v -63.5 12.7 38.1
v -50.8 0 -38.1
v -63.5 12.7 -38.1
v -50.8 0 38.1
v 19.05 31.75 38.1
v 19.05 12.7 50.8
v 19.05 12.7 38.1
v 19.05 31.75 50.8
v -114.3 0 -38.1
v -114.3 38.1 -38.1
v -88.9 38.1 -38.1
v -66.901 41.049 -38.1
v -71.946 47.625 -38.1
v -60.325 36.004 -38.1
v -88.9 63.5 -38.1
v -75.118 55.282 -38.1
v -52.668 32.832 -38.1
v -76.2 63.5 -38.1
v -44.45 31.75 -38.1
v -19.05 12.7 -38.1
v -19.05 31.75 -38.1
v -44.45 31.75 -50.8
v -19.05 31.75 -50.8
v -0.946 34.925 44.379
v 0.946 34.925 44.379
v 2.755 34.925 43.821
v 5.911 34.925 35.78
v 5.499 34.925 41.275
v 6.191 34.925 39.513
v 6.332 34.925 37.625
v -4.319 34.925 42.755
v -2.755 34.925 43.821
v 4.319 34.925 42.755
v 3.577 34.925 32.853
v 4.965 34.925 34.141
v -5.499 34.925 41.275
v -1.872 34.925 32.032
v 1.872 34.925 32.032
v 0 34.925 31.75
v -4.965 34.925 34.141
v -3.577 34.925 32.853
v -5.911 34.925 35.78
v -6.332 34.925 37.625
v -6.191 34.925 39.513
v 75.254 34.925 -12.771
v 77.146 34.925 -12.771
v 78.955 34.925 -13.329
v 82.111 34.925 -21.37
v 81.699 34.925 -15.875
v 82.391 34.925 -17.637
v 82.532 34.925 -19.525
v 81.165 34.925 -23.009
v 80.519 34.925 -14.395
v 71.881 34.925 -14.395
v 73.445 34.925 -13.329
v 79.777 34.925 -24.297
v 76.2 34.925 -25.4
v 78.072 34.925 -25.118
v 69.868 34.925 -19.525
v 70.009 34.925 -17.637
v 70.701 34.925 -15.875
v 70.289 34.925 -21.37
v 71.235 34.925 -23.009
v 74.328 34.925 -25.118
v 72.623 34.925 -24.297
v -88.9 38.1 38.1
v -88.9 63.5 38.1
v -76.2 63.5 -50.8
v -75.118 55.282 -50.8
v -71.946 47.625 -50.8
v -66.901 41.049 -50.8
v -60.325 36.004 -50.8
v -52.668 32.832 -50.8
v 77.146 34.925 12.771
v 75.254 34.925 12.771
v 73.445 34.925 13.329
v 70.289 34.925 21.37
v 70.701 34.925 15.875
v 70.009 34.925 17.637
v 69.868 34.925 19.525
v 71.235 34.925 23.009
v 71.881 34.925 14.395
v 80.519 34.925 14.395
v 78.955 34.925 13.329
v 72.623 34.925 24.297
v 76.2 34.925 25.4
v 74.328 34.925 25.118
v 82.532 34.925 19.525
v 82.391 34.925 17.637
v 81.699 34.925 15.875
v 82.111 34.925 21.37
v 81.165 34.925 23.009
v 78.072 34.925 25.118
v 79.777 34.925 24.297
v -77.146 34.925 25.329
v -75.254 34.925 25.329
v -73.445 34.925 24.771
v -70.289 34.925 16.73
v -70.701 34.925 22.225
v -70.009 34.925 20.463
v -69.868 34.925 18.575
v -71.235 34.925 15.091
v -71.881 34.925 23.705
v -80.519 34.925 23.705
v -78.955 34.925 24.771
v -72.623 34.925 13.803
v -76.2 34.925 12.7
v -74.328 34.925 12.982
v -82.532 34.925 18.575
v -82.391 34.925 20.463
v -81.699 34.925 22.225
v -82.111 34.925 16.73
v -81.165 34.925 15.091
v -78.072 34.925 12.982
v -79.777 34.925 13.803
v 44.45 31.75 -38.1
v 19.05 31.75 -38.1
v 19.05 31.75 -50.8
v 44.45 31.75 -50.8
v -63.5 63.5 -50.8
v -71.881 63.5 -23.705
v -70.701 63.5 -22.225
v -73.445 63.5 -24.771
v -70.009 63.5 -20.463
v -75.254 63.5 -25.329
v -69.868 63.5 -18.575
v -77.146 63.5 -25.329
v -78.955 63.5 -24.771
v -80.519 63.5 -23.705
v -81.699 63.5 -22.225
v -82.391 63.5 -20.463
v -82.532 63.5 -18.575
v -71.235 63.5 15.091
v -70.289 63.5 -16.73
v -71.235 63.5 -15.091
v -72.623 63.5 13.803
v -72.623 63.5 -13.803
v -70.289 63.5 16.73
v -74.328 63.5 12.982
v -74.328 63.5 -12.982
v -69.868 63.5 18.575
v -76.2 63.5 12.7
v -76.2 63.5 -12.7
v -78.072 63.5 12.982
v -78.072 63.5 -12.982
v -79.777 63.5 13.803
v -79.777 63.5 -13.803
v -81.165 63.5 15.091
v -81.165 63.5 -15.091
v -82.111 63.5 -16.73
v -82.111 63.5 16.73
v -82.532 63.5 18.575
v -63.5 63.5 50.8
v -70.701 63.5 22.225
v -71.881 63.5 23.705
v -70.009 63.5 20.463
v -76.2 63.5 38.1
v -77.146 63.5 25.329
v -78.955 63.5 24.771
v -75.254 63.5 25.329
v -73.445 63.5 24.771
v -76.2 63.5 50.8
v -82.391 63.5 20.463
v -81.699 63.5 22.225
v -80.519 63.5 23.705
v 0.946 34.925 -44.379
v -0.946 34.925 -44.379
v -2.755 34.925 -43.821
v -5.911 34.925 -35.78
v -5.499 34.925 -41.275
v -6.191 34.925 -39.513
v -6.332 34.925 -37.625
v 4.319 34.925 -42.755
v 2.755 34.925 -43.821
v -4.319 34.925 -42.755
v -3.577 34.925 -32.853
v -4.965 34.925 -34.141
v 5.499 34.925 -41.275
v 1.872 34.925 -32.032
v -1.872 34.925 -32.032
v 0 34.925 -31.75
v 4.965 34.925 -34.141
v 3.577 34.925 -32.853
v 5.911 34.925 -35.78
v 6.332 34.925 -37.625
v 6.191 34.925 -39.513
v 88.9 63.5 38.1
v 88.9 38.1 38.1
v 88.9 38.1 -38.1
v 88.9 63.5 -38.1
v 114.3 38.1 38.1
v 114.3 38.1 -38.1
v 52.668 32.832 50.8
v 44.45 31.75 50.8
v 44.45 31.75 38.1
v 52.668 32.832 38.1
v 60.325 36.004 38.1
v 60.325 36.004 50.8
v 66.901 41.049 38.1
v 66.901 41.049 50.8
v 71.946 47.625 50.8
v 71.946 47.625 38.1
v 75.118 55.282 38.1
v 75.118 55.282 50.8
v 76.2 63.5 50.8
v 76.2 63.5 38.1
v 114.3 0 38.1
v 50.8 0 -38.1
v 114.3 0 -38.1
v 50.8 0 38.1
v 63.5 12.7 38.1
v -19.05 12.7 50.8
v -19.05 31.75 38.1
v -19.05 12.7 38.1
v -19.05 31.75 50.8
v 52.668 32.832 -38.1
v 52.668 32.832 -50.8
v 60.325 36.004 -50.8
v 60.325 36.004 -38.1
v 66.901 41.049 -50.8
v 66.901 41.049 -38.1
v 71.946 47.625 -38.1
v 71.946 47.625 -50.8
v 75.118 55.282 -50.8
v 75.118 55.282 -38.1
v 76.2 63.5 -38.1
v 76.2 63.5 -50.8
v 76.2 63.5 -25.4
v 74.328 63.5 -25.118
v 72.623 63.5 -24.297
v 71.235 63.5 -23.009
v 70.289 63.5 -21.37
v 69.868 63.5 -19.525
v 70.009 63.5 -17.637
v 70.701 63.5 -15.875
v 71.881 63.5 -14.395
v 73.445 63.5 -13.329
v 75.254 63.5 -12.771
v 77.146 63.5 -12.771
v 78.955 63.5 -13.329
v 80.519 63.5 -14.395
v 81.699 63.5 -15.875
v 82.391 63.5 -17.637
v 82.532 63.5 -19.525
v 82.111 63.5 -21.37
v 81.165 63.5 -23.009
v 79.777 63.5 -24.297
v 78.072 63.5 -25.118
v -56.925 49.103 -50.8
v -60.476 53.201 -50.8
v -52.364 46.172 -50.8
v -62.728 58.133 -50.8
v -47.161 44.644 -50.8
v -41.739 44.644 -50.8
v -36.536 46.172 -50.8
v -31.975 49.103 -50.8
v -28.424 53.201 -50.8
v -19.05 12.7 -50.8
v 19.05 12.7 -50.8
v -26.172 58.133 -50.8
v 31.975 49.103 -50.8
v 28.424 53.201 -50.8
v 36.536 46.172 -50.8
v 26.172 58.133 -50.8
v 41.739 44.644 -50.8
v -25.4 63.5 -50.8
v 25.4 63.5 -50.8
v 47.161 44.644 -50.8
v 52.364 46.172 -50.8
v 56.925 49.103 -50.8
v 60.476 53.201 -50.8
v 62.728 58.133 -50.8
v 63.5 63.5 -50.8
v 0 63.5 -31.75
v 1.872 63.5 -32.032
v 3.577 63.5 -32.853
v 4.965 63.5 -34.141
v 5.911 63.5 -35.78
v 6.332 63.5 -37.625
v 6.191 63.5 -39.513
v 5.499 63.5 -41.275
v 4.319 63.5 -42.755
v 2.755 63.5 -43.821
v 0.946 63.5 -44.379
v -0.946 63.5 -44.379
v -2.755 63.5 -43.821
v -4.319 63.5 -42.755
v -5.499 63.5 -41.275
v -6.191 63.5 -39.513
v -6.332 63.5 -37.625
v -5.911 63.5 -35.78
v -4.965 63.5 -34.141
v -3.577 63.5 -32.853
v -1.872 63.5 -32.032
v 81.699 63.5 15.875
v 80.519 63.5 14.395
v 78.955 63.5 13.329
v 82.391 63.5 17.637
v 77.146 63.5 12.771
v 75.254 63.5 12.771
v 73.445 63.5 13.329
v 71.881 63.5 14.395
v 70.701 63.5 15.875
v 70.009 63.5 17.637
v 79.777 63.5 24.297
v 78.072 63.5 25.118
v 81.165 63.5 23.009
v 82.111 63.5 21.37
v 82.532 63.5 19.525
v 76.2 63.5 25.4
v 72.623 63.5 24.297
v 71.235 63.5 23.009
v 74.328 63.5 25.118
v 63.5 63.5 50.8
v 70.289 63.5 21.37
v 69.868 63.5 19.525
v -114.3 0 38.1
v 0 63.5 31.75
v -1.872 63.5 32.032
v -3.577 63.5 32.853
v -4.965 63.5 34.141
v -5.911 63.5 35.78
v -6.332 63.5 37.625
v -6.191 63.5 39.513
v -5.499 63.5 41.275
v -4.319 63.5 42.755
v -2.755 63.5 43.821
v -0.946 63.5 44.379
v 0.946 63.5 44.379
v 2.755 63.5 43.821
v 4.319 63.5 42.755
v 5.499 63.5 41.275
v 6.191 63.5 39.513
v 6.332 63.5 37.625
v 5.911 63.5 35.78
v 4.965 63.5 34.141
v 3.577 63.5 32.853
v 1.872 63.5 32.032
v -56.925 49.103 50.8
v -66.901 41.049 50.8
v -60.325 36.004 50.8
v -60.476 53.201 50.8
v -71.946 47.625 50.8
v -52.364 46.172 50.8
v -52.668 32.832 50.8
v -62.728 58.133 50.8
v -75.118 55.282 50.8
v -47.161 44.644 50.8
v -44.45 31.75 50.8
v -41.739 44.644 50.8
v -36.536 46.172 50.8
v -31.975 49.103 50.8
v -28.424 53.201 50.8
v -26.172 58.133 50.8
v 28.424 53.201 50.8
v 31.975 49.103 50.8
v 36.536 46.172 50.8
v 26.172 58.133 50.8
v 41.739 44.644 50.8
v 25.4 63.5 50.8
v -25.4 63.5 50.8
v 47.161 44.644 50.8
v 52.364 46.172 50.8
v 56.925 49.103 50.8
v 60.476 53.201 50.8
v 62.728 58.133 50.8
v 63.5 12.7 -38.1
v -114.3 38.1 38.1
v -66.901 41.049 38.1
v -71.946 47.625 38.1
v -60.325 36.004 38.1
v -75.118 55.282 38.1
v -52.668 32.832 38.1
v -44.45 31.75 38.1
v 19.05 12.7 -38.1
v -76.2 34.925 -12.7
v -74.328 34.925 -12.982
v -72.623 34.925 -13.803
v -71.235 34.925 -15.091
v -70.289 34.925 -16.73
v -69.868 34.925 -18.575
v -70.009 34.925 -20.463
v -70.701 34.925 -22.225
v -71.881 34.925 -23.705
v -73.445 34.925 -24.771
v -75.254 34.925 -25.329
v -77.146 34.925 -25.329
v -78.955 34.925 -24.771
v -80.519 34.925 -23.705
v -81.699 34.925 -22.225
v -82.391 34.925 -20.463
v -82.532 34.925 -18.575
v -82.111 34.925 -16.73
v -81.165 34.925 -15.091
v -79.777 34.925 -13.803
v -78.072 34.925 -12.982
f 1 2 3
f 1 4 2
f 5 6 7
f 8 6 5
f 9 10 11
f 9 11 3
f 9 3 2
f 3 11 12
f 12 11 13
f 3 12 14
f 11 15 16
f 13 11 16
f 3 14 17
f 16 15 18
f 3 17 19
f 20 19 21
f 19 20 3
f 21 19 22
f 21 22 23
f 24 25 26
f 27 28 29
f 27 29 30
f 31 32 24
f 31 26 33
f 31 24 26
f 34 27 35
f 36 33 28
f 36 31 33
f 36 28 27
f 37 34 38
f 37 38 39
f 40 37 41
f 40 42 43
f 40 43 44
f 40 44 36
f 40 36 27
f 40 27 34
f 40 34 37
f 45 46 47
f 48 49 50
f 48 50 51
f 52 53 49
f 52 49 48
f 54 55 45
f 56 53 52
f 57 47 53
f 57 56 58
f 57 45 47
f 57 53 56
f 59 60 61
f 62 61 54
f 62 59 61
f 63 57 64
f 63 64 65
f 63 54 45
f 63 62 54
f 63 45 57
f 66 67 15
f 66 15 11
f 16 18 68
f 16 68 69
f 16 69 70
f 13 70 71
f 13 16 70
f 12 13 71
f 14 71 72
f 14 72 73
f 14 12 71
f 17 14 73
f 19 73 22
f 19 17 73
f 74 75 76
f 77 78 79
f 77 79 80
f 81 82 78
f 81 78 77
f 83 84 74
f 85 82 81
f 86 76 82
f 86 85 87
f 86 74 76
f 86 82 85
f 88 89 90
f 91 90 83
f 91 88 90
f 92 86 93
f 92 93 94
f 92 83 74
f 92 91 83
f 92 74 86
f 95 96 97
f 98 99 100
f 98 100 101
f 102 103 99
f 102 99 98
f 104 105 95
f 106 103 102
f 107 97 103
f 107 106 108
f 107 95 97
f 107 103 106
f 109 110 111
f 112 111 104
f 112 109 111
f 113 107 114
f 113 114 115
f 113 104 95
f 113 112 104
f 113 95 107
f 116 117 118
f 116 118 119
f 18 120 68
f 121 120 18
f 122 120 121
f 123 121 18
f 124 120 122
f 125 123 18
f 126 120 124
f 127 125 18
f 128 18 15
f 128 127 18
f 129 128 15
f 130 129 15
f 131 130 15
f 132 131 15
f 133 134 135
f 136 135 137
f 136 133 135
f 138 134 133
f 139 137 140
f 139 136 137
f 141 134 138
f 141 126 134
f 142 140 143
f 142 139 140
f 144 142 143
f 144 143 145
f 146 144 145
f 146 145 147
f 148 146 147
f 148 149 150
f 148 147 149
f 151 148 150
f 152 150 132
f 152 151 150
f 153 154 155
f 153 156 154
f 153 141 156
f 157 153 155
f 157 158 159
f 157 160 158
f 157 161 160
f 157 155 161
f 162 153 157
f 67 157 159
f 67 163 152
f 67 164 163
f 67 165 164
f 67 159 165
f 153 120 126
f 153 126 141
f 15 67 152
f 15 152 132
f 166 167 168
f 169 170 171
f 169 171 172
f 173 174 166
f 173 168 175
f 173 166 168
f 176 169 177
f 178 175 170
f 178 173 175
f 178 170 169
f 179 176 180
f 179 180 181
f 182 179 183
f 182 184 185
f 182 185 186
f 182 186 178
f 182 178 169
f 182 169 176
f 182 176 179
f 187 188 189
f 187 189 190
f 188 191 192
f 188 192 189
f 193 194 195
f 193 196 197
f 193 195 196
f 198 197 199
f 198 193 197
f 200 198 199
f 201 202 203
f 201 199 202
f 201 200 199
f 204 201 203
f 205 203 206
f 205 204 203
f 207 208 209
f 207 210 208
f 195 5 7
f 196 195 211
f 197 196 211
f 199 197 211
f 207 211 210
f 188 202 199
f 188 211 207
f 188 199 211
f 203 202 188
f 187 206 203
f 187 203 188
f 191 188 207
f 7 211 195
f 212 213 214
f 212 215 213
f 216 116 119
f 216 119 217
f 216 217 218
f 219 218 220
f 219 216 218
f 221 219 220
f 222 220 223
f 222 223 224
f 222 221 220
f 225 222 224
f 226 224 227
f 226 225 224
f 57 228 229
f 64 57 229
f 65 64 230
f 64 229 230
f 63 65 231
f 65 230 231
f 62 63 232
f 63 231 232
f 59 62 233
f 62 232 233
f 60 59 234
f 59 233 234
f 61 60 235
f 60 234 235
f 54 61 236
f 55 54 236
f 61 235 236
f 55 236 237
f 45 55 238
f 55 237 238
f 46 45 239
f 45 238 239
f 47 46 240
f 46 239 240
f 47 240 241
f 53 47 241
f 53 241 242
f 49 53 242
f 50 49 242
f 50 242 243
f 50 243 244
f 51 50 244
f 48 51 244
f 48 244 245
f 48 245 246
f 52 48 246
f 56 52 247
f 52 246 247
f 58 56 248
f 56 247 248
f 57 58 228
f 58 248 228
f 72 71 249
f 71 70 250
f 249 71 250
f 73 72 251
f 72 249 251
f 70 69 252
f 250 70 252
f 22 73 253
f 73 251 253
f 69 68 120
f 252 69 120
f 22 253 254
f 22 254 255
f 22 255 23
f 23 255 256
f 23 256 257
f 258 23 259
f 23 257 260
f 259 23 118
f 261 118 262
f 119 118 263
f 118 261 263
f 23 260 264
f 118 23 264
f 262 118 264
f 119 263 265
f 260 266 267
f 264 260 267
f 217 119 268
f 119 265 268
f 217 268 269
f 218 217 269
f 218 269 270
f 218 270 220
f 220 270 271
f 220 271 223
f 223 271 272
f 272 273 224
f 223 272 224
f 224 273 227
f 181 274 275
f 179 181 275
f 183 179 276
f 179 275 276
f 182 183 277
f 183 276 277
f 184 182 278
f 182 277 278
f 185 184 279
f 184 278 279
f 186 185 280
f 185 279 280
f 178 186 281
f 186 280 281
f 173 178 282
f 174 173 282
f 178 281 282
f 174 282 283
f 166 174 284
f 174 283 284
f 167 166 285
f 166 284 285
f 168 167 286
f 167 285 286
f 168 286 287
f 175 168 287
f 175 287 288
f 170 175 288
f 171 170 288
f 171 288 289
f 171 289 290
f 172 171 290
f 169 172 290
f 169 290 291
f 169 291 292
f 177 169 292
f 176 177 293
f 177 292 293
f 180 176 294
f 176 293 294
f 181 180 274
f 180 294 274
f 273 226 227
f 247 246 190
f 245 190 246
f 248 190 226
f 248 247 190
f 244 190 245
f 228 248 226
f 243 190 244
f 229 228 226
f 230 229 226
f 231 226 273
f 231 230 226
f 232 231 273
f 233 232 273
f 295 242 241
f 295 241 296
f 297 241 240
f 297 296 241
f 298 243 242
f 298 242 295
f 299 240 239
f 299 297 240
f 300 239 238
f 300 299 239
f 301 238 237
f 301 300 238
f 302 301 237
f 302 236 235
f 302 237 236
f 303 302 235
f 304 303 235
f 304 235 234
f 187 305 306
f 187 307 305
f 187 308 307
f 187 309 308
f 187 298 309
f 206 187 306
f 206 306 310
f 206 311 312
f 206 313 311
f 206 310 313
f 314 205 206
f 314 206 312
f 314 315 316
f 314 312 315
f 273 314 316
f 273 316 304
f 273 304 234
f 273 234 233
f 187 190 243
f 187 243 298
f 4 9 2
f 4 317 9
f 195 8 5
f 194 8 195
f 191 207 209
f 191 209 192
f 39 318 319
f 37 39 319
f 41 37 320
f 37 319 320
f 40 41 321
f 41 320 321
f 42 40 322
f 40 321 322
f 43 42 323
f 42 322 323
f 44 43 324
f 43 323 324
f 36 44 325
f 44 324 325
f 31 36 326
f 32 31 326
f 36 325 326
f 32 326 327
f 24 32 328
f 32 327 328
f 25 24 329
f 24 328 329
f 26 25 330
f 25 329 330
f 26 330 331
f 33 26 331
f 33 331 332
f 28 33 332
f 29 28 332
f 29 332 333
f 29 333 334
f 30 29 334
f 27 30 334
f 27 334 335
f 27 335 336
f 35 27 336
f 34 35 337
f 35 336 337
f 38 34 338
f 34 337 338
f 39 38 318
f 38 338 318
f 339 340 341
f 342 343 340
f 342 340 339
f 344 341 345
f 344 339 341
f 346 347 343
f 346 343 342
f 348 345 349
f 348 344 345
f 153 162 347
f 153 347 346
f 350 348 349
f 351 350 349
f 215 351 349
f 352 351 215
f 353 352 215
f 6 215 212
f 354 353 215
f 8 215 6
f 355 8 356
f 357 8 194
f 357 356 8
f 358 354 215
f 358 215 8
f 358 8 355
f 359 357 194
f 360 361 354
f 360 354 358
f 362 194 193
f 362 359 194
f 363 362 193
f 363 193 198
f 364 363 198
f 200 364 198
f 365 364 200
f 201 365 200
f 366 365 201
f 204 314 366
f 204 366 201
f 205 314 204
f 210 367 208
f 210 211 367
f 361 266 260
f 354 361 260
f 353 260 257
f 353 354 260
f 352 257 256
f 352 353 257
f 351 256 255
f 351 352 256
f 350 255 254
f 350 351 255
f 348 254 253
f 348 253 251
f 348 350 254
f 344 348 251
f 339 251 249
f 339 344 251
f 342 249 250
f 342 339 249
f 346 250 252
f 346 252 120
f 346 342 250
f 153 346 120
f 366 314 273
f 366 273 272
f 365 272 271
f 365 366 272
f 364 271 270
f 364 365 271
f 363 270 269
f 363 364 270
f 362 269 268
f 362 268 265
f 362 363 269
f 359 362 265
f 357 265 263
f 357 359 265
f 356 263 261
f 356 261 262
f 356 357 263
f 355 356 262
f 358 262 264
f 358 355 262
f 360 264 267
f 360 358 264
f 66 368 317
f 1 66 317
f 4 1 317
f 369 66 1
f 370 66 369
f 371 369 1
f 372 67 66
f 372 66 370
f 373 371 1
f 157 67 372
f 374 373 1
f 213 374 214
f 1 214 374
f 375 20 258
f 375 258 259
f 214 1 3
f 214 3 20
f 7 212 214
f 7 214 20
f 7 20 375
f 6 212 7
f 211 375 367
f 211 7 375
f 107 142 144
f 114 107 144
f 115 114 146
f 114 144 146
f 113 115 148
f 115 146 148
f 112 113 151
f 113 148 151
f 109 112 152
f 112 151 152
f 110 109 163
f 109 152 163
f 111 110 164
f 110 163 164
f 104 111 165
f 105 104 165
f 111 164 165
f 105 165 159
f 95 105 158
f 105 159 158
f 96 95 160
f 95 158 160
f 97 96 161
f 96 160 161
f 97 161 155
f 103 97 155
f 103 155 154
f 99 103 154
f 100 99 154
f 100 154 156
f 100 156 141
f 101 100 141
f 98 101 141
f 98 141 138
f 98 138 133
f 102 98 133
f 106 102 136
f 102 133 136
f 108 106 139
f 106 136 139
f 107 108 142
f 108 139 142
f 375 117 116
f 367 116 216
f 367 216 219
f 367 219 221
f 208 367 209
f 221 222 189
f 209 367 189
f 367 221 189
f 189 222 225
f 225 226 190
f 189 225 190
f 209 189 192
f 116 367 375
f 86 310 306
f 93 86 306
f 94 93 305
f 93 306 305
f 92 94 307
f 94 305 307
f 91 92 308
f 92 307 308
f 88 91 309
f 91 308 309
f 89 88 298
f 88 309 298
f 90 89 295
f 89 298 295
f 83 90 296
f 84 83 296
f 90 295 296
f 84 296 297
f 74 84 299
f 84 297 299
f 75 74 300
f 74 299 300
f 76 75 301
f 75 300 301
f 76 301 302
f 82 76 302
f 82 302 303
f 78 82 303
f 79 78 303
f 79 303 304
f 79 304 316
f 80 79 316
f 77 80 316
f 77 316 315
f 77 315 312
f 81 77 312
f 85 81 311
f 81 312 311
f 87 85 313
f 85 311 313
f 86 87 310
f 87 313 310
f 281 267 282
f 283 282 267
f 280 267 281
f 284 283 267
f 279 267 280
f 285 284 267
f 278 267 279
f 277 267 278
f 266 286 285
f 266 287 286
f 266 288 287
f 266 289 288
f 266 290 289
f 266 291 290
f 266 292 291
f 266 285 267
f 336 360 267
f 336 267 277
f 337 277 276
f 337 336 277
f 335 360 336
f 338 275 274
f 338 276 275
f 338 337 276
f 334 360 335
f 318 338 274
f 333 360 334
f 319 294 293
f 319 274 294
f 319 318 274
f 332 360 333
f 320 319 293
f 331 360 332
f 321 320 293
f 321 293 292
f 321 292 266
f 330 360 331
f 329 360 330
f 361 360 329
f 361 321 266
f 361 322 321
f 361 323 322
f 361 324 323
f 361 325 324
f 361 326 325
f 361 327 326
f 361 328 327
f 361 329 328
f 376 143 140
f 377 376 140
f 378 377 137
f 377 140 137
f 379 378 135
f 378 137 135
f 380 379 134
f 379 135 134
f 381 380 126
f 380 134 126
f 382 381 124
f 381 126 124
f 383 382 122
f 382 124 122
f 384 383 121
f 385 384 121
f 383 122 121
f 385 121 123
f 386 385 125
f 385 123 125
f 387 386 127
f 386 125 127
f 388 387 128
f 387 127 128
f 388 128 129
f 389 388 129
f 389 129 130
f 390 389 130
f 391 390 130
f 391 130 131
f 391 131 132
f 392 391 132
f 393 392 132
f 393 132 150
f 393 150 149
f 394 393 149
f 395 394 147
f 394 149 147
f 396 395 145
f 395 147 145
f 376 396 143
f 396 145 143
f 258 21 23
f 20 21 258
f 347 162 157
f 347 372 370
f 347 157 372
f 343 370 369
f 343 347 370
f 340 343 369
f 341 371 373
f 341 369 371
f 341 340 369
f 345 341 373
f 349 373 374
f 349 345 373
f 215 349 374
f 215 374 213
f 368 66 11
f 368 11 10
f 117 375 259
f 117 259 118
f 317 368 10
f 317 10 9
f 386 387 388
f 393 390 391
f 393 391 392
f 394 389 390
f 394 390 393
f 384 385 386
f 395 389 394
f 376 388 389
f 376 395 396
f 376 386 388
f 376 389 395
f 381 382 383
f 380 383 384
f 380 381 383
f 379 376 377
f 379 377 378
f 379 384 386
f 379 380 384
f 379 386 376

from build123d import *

# Parameters (mm, degrees)
BOSS_EXTRUDE1_DEPTH   = 38.1
BOSS_EXTRUDE1_2_DEPTH = 38.1
BOSS_EXTRUDE2_DEPTH   = 50.8
SKETCH2_R             = 6.35
CUT_EXTRUDE2_DEPTH    = 28.575
SKETCH3_W             = 38.1
SKETCH3_H             = 101.6
CUT_EXTRUDE3_DEPTH    = 12.7


with BuildPart() as part:
    # Sketch1 → Boss-Extrude1 (new, symmetric)
    with BuildSketch(Plane.XY):
        with BuildLine():
            Line((50.8, 0), (114.3, 0))
            Line((114.3, 0), (114.3, 38.1))
            Line((114.3, 38.1), (88.9, 38.1))
            Line((88.9, 38.1), (88.9, 63.5))
            Line((88.9, 63.5), (76.2, 63.5))
            ThreePointArc((76.2, 63.5), (66.900640303, 41.049359697), (44.45, 31.75))
            Line((44.45, 31.75), (19.05, 31.75))
            Line((19.05, 31.75), (19.05, 12.7))
            Line((19.05, 12.7), (63.5, 12.7))
            Line((63.5, 12.7), (50.8, 0))
        make_face()
    extrude(amount=BOSS_EXTRUDE1_DEPTH, both=True)



with BuildPart() as body_2:
    # Sketch1 → Boss-Extrude1 2 (new, symmetric)
    with BuildSketch(Plane.XY):
        with BuildLine():
            Line((-63.5, 12.7), (-19.05, 12.7))
            Line((-19.05, 12.7), (-19.05, 31.75))
            Line((-19.05, 31.75), (-44.45, 31.75))
            ThreePointArc((-44.45, 31.75), (-66.900640303, 41.049359697), (-76.2, 63.5))
            Line((-76.2, 63.5), (-88.9, 63.5))
            Line((-88.9, 63.5), (-88.9, 38.1))
            Line((-88.9, 38.1), (-114.3, 38.1))
            Line((-114.3, 38.1), (-114.3, 0))
            Line((-114.3, 0), (-50.8, 0))
            Line((-50.8, 0), (-63.5, 12.7))
        make_face()
    extrude(amount=BOSS_EXTRUDE1_2_DEPTH, both=True)


with BuildPart() as part_1:
    add(part.part)

    add(body_2.part)  # Boss-Extrude2 merges body 2
    # Sketch1<3> → Boss-Extrude2 (add, symmetric)
    with BuildSketch(Plane.XY):
        with BuildLine():
            Line((19.05, 0), (19.05, 12.7))
            Line((19.05, 12.7), (19.05, 31.75))
            Line((19.05, 31.75), (44.45, 31.75))
            ThreePointArc((44.45, 31.75), (66.900640303, 41.049359697), (76.2, 63.5))
            Line((76.2, 63.5), (63.5, 63.5))
            ThreePointArc((63.5, 63.5), (44.45, 44.45), (25.4, 63.5))
            Line((25.4, 63.5), (0, 63.5))
            Line((0, 63.5), (0, 0))
            Line((0, 0), (19.05, 0))
        make_face()
        with BuildLine():
            Line((-19.05, 0), (0, 0))
            Line((0, 0), (0, 63.5))
            Line((0, 63.5), (-25.4, 63.5))
            ThreePointArc((-25.4, 63.5), (-44.45, 44.45), (-63.5, 63.5))
            Line((-63.5, 63.5), (-76.2, 63.5))
            ThreePointArc((-76.2, 63.5), (-66.900640303, 41.049359697), (-44.45, 31.75))
            Line((-44.45, 31.75), (-19.05, 31.75))
            Line((-19.05, 31.75), (-19.05, 12.7))
            Line((-19.05, 12.7), (-19.05, 0))
        make_face()
    extrude(amount=BOSS_EXTRUDE2_DEPTH, both=True)

    # Sketch2 → Cut-Extrude2 (cut)
    with BuildSketch(Plane(origin=(0, 63.5, 0), x_dir=(1, 0, 0), z_dir=(0, 1, 0))):
        with Locations(Location((-76.2, 19.05, 0), (0, 0, 270))):
            Circle(SKETCH2_R)
        with Locations(Location((0, 38.1, 0), (0, 0, 270))):
            Circle(SKETCH2_R)
        with Locations(Location((76.2, 19.05, 0), (0, 0, 90))):
            Circle(SKETCH2_R)
        with Locations(Location((76.2, -19.05, 0), (0, 0, 270))):
            Circle(SKETCH2_R)
        with Locations(Location((0, -38.1, 0), (0, 0, 90))):
            Circle(SKETCH2_R)
        with Locations(Location((-76.2, -19.05, 0), (0, 0, 90))):
            Circle(SKETCH2_R)
    extrude(amount=-CUT_EXTRUDE2_DEPTH, mode=Mode.SUBTRACT)

    # Sketch3 → Cut-Extrude3 (cut)
    with BuildSketch(Plane.XZ):
        Rectangle(SKETCH3_W, SKETCH3_H)
    extrude(amount=-CUT_EXTRUDE3_DEPTH, mode=Mode.SUBTRACT)


solid = part_1.part
